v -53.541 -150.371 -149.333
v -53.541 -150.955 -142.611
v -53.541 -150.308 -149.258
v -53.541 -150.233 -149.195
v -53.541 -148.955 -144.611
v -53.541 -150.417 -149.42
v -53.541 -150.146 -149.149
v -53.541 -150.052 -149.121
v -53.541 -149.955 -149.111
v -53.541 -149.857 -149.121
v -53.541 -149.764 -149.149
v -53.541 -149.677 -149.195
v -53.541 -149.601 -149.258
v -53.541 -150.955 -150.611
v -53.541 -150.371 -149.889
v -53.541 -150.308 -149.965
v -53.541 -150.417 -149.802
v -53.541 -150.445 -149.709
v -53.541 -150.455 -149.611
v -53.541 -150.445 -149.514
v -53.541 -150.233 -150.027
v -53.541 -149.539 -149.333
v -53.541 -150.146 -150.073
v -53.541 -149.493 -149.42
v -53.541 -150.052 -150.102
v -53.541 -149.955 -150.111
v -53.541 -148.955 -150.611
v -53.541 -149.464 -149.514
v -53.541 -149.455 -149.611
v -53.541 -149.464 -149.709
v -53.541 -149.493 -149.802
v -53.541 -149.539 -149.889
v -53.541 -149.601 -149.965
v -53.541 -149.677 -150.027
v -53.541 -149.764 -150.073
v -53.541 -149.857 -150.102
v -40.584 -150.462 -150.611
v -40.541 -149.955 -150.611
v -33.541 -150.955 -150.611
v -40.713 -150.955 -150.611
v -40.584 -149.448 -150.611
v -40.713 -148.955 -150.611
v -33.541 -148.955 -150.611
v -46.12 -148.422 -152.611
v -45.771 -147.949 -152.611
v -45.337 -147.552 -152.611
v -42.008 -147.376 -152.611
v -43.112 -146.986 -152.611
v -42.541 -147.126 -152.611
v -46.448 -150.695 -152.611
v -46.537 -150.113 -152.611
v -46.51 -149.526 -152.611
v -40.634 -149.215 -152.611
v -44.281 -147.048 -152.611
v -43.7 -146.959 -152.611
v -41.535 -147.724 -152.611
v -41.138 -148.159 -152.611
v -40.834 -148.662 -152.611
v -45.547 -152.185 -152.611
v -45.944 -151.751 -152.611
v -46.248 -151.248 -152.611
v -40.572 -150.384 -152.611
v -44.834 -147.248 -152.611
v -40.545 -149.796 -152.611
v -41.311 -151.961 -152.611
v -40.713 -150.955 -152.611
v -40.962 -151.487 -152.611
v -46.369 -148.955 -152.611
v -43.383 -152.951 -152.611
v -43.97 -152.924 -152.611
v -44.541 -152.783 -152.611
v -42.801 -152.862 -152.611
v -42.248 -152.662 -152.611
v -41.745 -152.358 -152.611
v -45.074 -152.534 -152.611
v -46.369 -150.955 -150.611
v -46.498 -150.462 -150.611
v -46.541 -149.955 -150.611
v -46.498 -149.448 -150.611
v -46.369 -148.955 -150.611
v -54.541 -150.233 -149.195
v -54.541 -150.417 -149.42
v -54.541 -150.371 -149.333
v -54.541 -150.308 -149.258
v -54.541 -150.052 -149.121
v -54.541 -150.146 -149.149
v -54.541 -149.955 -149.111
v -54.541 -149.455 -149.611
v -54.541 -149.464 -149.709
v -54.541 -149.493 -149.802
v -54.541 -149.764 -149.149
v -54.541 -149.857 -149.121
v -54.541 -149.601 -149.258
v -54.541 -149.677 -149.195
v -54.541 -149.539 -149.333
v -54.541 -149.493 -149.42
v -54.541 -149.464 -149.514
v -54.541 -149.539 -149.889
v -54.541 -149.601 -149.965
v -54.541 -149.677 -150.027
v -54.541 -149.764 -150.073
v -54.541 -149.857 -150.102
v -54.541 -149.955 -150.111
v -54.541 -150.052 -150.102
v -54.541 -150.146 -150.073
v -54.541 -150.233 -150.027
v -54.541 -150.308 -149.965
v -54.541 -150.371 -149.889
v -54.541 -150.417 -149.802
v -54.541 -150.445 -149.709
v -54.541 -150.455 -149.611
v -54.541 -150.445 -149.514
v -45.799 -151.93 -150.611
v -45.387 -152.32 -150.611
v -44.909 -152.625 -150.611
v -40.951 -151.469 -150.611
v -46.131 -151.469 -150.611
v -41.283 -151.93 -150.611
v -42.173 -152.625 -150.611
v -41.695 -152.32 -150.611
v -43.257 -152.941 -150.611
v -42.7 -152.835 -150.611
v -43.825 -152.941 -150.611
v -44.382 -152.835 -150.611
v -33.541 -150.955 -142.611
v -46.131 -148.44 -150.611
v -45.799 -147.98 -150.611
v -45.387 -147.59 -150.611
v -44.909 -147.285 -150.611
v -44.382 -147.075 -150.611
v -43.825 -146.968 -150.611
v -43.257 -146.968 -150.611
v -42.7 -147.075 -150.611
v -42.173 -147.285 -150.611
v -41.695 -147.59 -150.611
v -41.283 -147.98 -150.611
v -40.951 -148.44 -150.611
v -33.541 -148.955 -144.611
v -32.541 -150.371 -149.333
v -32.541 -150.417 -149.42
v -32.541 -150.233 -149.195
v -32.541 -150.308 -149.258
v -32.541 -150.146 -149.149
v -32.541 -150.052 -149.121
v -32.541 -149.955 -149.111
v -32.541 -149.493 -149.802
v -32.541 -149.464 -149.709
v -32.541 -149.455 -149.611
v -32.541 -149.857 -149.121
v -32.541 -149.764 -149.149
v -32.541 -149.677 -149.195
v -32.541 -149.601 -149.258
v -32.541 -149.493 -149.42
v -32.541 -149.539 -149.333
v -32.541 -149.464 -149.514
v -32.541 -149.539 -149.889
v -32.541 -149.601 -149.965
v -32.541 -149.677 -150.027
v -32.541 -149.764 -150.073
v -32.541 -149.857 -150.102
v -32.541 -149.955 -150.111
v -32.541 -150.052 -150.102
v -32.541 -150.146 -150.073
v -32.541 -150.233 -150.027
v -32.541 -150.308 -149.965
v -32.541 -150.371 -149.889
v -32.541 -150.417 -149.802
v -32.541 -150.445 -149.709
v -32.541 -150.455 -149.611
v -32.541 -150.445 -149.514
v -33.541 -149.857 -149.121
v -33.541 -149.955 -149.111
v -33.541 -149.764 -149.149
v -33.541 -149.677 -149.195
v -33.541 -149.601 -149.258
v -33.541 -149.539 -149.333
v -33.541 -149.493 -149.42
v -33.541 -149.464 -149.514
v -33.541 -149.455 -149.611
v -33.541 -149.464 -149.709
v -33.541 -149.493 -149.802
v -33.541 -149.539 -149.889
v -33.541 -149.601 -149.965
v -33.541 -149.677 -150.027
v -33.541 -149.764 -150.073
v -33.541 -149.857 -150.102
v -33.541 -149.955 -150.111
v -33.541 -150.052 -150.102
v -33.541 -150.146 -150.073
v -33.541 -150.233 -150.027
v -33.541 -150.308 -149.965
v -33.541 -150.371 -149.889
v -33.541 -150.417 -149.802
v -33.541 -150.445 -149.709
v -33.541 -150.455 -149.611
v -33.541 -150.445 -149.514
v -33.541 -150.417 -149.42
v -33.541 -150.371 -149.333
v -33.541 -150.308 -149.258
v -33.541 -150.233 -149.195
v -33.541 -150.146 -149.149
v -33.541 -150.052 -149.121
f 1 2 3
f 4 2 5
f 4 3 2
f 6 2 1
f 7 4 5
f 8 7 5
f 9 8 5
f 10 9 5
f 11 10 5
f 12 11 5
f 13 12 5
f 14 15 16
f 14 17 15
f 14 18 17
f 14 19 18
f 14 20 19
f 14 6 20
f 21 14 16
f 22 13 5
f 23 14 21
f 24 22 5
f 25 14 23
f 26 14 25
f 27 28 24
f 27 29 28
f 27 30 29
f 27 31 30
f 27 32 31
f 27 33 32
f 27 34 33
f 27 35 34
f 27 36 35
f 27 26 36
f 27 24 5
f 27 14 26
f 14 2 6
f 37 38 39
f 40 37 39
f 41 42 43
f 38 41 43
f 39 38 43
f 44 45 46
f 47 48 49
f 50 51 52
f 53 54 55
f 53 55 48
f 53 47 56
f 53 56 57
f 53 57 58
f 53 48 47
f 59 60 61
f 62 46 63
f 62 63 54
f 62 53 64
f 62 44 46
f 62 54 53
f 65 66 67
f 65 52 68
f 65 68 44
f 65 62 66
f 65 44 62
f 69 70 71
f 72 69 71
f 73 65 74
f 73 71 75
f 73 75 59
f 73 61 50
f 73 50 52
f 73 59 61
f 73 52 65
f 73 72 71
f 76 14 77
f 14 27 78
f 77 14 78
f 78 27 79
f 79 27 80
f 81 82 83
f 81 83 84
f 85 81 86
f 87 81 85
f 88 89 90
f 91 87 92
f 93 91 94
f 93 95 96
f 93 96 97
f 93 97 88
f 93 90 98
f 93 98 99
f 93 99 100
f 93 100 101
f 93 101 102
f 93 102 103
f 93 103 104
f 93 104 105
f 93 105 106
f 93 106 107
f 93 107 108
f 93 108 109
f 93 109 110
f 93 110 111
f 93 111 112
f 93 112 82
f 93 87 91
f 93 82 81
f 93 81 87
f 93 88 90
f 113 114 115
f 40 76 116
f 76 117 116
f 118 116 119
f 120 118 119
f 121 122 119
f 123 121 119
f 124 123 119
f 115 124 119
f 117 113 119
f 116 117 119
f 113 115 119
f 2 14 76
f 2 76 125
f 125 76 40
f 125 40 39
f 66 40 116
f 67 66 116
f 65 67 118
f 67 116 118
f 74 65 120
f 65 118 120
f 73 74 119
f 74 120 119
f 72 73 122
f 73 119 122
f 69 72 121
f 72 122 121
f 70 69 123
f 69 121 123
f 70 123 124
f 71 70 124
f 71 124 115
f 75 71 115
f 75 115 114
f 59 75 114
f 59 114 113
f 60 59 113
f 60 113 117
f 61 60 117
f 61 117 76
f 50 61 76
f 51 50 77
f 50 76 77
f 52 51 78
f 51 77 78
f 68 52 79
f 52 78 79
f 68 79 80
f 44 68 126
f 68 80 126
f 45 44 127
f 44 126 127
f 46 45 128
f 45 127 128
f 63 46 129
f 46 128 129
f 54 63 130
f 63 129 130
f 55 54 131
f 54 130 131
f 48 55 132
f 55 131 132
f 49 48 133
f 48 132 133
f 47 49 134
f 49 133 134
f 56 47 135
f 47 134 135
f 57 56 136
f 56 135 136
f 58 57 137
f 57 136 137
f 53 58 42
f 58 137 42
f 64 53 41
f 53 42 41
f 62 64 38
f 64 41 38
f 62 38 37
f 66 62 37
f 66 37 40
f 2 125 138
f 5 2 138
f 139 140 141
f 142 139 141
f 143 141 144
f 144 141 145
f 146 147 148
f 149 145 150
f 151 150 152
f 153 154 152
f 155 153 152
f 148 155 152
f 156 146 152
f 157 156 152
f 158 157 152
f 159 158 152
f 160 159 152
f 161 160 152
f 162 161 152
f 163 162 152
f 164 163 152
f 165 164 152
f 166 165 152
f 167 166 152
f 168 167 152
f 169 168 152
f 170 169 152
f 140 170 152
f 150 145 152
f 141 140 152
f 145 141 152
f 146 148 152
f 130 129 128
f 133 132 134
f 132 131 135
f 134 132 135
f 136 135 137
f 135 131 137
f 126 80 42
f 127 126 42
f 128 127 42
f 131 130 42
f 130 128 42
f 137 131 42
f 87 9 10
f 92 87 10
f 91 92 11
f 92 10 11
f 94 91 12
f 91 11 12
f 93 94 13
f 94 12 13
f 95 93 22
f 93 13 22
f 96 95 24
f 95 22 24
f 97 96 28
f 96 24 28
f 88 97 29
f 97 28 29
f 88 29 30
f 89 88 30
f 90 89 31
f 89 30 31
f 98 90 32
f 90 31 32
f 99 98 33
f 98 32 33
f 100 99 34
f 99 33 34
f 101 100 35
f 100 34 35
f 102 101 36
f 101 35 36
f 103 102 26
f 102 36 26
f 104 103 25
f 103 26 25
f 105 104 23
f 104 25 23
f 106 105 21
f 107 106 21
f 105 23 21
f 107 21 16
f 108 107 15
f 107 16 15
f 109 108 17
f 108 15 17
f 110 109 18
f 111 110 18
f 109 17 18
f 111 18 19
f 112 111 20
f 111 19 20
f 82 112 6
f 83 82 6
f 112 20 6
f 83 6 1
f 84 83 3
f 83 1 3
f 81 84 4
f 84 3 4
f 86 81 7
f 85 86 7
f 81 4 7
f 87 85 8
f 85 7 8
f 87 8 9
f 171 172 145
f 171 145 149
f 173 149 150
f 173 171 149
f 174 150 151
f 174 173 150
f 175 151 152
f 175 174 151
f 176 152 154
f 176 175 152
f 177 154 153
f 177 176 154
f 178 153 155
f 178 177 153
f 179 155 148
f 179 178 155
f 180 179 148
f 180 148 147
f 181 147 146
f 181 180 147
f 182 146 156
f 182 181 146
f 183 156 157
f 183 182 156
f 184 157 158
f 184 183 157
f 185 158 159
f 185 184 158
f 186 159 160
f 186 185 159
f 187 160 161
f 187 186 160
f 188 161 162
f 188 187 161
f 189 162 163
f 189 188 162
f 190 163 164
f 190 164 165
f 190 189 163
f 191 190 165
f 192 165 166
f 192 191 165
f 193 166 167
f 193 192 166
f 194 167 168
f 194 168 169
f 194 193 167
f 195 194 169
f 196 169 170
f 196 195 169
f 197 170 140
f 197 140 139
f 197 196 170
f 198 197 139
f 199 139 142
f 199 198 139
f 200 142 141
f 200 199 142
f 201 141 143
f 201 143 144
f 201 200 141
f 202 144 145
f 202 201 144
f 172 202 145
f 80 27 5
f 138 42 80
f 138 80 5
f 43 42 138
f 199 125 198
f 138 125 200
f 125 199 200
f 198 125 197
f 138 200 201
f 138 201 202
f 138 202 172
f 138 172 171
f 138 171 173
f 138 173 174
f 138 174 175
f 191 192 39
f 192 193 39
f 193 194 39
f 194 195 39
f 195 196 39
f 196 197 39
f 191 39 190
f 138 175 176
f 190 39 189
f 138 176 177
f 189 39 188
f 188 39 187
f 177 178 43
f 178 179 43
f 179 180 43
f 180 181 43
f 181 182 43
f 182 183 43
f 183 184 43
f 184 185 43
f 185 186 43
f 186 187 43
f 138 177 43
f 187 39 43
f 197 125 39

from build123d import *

# Parameters (mm, degrees)
BOSS_EXTRUDE1_DEPTH      = 4
BOSS_EXTRUDE1_DEPTH_BACK = 4
SKETCH2_W                = 20
SKETCH2_H                = 2
CUT_EXTRUDE1_DEPTH       = 20
SKETCH5_R                = 0.5
BOSS_EXTRUDE3_DEPTH      = 1
SKETCH8_R                = 3
BOSS_EXTRUDE5_DEPTH      = 2


with BuildPart() as part:
    # Sketch2 → Boss-Extrude1 (new, two sides: drawn at the far end of the back side and taken through both)
    with BuildSketch(Plane.XY.offset(-146.611129216).offset(-BOSS_EXTRUDE1_DEPTH_BACK)):
        with Locations((-43.541013266, -149.954890484)):
            Rectangle(SKETCH2_W, SKETCH2_H)
    extrude(amount=BOSS_EXTRUDE1_DEPTH + BOSS_EXTRUDE1_DEPTH_BACK)

    # Sketch4 → Cut-Extrude1 (cut)
    with BuildSketch(Plane.ZY.offset(53.541013266)):
        Polygon((-142.611129216, -148.954890484), (-142.611129216, -150.954890484), (-144.611129216, -148.954890484), align=None)
    extrude(amount=-CUT_EXTRUDE1_DEPTH, mode=Mode.SUBTRACT)

    # Sketch5 → Boss-Extrude3 (add)
    with BuildSketch(Plane.ZY.offset(53.541013266)):
        with Locations((-149.611129216, -149.954890484)):
            Circle(SKETCH5_R)
    boss_extrude3 = extrude(amount=BOSS_EXTRUDE3_DEPTH)

    # Mirror2: Boss-Extrude3 across plane
    add(boss_extrude3.mirror(Plane.ZY.offset(43.541013266)))

    # Sketch8 → Boss-Extrude5 (add)
    with BuildSketch(Plane(origin=(0, 0, -150.611129216), x_dir=(-1, 0, 0), z_dir=(0, 0, -1))):
        with Locations(Location((43.541013266, -149.954890484, 0), (0, 0, 199.471220634))):
            Circle(SKETCH8_R)
    extrude(amount=BOSS_EXTRUDE5_DEPTH)


solid = part.part
